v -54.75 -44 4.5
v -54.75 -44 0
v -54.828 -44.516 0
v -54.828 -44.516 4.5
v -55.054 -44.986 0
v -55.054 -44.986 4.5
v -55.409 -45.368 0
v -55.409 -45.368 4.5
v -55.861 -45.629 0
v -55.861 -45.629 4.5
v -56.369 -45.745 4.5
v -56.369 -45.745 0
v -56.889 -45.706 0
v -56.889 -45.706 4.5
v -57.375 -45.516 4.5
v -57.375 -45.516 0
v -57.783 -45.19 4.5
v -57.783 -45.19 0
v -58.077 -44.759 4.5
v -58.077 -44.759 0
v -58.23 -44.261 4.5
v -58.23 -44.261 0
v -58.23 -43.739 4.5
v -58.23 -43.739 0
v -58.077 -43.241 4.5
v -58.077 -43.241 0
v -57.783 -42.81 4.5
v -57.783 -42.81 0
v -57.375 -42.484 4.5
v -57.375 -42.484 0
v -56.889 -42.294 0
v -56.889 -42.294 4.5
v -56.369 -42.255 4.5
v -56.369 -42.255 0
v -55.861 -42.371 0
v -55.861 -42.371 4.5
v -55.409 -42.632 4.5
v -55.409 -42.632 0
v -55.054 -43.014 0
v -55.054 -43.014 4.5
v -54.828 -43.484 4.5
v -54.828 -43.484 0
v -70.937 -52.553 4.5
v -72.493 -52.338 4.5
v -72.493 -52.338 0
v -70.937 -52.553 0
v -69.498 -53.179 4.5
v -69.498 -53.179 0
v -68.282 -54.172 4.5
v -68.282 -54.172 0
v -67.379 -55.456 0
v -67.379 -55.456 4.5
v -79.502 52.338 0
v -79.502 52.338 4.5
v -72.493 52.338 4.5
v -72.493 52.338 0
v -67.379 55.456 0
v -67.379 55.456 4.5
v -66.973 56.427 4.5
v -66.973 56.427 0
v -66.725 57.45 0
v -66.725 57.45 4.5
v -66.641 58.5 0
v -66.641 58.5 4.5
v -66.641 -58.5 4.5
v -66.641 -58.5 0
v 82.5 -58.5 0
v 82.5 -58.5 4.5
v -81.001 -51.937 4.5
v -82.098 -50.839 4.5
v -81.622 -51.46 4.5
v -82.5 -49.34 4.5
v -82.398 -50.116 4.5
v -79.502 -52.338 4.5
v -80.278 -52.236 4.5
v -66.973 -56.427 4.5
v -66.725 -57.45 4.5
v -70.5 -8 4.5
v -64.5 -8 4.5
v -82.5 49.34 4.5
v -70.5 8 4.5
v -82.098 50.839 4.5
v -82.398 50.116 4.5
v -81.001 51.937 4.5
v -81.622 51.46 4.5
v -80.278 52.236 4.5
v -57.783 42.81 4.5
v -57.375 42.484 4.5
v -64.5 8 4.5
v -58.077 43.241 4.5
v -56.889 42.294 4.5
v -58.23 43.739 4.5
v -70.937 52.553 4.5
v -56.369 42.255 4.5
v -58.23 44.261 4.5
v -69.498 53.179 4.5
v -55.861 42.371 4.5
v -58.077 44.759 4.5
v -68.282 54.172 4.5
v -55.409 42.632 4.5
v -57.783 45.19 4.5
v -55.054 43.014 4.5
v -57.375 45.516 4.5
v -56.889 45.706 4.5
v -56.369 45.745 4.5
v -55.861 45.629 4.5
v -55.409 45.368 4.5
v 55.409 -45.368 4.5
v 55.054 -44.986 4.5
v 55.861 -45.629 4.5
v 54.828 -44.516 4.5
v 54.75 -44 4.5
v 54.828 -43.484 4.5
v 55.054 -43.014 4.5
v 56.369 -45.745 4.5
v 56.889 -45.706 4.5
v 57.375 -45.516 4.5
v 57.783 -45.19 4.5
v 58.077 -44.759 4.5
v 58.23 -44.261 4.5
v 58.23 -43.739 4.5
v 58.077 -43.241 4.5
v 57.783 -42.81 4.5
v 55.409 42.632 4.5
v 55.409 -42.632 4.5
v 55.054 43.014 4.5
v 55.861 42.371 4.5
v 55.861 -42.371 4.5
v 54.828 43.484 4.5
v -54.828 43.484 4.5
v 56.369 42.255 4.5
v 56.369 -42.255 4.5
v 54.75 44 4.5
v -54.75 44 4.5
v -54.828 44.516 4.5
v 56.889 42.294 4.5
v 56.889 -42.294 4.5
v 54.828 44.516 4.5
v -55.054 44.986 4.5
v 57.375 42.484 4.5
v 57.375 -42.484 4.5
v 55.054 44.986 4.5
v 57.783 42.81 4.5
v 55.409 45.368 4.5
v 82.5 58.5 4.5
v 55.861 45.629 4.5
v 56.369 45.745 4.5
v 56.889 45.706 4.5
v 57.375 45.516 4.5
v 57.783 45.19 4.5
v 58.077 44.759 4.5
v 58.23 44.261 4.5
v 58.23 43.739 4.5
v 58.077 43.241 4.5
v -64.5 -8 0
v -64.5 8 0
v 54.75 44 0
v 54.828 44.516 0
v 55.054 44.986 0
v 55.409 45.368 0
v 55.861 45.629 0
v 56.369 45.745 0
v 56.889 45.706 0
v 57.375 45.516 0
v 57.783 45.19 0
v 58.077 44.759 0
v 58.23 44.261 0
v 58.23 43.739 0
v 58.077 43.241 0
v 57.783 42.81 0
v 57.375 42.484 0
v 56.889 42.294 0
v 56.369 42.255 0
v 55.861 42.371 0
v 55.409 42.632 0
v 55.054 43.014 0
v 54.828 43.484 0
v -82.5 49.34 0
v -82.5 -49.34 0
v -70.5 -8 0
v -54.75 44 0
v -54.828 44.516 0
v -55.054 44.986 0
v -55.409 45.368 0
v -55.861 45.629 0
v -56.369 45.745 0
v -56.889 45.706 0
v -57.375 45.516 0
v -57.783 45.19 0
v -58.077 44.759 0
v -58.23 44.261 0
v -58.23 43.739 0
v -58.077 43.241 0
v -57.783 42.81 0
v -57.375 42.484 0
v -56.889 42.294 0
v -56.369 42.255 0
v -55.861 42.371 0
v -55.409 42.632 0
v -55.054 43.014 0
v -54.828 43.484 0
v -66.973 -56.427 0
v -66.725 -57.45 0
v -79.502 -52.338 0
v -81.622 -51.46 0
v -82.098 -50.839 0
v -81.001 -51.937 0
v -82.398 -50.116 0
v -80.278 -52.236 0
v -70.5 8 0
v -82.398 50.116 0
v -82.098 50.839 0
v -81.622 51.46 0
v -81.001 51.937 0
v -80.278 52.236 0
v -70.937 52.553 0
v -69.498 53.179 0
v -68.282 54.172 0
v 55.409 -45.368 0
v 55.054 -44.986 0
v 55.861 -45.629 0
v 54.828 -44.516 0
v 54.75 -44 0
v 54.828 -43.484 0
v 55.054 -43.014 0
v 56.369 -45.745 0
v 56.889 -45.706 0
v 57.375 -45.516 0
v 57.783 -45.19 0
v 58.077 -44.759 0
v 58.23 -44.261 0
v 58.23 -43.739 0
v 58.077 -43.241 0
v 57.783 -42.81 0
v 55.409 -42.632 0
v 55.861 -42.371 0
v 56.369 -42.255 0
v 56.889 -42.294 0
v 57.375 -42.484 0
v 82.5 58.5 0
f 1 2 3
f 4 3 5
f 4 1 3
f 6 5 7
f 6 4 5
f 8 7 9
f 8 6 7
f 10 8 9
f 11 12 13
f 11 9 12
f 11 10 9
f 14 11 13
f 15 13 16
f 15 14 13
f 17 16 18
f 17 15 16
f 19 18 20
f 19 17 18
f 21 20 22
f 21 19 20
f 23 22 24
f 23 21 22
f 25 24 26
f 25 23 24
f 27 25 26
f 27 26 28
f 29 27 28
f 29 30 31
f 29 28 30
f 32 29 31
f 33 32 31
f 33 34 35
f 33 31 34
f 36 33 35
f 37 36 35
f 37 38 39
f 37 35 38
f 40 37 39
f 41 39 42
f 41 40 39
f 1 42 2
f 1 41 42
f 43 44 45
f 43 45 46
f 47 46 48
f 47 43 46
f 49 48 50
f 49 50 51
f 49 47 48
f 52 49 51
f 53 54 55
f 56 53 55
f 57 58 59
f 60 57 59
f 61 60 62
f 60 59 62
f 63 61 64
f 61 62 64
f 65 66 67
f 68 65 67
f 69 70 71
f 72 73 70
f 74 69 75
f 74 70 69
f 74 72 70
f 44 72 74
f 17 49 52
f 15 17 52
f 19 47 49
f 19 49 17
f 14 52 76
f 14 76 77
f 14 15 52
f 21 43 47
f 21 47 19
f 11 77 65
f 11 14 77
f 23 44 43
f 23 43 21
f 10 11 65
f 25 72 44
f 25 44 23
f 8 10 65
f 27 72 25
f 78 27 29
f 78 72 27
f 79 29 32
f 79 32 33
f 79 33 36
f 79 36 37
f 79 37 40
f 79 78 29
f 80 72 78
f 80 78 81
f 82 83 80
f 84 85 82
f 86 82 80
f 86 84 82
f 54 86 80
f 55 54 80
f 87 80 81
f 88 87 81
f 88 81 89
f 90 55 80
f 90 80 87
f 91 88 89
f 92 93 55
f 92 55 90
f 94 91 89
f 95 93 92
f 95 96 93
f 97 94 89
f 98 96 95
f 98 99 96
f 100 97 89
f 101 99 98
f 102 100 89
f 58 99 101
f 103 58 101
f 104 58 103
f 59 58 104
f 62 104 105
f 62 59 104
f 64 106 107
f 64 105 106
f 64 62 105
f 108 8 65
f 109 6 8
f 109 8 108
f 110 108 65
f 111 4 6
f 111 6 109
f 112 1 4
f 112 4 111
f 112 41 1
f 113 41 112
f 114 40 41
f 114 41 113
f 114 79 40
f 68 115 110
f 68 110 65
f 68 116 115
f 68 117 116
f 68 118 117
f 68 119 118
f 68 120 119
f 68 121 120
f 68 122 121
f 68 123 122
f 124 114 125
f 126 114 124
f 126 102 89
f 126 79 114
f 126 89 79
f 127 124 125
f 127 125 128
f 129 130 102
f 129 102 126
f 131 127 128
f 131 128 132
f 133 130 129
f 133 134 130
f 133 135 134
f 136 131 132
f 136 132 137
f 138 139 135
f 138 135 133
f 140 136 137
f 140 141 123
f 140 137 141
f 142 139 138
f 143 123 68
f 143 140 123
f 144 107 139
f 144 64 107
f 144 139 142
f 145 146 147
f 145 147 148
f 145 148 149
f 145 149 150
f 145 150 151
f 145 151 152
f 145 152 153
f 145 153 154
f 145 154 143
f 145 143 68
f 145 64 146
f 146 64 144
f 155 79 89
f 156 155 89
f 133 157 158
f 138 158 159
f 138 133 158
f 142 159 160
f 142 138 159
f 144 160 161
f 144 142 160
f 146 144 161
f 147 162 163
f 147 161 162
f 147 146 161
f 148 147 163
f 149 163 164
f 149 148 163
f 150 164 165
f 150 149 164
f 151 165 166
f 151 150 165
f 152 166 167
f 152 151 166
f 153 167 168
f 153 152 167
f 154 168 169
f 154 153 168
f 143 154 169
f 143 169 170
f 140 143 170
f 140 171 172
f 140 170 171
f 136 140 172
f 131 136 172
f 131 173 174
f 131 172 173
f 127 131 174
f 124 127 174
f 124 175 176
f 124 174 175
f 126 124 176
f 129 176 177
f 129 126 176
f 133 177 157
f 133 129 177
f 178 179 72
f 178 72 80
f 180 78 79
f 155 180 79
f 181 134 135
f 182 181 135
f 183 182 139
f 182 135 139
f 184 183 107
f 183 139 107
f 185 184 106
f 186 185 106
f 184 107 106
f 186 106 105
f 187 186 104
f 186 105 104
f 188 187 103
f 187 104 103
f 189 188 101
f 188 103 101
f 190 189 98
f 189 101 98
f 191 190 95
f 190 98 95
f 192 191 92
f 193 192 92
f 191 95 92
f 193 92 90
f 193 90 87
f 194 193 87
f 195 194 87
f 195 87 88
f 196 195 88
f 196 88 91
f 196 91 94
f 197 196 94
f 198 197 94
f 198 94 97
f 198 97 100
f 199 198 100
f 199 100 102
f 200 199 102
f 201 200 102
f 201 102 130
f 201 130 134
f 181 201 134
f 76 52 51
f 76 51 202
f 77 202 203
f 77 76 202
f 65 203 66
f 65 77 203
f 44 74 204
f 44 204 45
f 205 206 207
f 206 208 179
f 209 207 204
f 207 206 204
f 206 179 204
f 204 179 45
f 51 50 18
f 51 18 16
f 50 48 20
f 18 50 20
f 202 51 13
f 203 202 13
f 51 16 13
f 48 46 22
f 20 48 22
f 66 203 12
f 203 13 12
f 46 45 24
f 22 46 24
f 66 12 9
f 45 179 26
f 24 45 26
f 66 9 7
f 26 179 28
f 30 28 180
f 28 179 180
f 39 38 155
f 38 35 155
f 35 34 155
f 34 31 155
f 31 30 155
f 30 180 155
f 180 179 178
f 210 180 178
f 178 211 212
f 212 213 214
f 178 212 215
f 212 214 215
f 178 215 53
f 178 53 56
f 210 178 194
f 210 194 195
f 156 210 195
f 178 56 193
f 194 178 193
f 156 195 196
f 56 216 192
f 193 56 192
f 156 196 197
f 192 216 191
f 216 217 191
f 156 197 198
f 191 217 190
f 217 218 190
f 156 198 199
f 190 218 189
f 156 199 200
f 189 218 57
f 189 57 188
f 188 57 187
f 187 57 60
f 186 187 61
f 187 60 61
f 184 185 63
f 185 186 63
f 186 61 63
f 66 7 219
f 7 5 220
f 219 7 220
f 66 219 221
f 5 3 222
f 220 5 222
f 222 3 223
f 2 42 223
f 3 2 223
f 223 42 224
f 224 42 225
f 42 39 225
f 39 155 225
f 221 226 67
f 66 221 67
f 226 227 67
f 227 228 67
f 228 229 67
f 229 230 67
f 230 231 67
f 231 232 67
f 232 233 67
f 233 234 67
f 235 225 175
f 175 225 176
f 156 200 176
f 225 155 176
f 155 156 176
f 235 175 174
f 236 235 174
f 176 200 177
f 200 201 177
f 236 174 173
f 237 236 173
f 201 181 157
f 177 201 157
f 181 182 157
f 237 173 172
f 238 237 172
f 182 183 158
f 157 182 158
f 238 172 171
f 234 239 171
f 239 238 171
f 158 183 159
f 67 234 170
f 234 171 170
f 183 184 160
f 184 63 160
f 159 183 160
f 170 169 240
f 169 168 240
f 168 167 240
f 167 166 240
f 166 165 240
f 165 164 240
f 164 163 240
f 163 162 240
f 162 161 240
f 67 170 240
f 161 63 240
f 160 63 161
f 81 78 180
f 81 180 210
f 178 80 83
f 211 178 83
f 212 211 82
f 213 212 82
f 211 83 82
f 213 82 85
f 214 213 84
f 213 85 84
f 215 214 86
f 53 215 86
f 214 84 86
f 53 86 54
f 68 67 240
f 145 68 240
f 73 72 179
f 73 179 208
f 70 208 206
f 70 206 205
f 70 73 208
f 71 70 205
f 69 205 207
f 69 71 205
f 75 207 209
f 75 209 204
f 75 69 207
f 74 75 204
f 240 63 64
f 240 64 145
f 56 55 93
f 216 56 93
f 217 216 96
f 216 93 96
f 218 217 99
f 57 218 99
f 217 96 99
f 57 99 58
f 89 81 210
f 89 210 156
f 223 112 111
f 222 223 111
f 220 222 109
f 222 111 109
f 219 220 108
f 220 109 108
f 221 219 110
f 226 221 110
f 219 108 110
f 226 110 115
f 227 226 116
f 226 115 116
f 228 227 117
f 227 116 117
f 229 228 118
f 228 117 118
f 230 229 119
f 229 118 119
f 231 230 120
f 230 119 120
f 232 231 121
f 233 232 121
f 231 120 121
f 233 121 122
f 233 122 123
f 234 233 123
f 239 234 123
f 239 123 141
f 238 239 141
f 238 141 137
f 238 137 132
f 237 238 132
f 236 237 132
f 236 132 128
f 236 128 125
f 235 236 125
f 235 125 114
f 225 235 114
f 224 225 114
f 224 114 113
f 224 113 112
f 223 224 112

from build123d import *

# Parameters (mm, degrees)
SKETCH2_W               = 165
SKETCH2_H               = 117
BOSS_EXTRUDE1_DEPTH     = 4.5
SKETCH3_R               = 1.75
CUT_EXTRUDE1_DEPTH      = 5.5
MIRROR2_COPY_1_SKETCH_R = 1.75
MIRROR2_COPY_1_DEPTH    = 5.5
CUT_EXTRUDE2_REACH      = 6.5
SKETCH4_W               = 6
SKETCH4_H               = 16
CUT_EXTRUDE3_DEPTH      = 4.5


with BuildPart() as part:
    # Sketch2 → Boss-Extrude1 (new body)
    with BuildSketch(Plane.XY):
        Rectangle(SKETCH2_W, SKETCH2_H)
    extrude(amount=BOSS_EXTRUDE1_DEPTH)

    # Sketch3 → Cut-Extrude1 (cut, through all)
    with BuildSketch(Plane.XY.offset(4.5)):
        with Locations((-56.5, 44)):
            Circle(SKETCH3_R)
    cut_extrude1 = extrude(amount=-CUT_EXTRUDE1_DEPTH, mode=Mode.SUBTRACT)

    # Mirror1: Cut-Extrude1 across plane
    add(cut_extrude1.mirror(Plane(origin=(0, 0, 0), x_dir=(0, 0, 1), z_dir=(1, 0, 0))), mode=Mode.SUBTRACT)

    # Mirror2: Cut-Extrude1 across plane
    add(cut_extrude1.mirror(Plane.ZX), mode=Mode.SUBTRACT)

    # Mirror2 copy 1 sketch → Mirror2 copy 1 (cut, through all)
    with BuildSketch(Plane(origin=(0, 0, 4.5), x_dir=(-1, 0, 0), z_dir=(0, 0, 1))):
        with Locations((-56.5, 44)):
            Circle(MIRROR2_COPY_1_SKETCH_R)
    extrude(amount=-MIRROR2_COPY_1_DEPTH, mode=Mode.SUBTRACT)

    # Sketch4 → Cut-Extrude2 (cut, up to next)
    with BuildSketch(Plane.XY.offset(4.5), mode=Mode.PRIVATE) as cut_extrude2_sk1:
        with Locations((-67.5, 0)):
            Rectangle(SKETCH4_W, SKETCH4_H)
    cut_extrude2_tool1 = extrude(cut_extrude2_sk1.sketch, amount=-CUT_EXTRUDE2_REACH, mode=Mode.PRIVATE) & part.part
    add(cut_extrude2_tool1.solids().sort_by_distance((-67.5, 0, 4.5))[0], mode=Mode.SUBTRACT)

    # Sketch5 → Cut-Extrude3 (cut)
    with BuildSketch(Plane.XY.offset(4.5)):
        with BuildLine():
            ThreePointArc((-82.5, 49.340007913), (-81.621787101, 51.460201405), (-79.501593608, 52.338414304))
            Line((-79.501593608, 52.338414304), (-72.492625761, 52.338414304))
            ThreePointArc((-72.492625761, 52.338414304), (-69.498148124, 53.179301378), (-67.379159906, 55.456114132))
            ThreePointArc((-67.379159906, 55.456114132), (-66.828268927, 56.933959128), (-66.641125435, 58.5))
            Line((-66.641125435, 58.5), (-82.5, 58.5))
            Line((-82.5, 58.5), (-82.5, 49.340007913))
        make_face()
    cut_extrude3 = extrude(amount=-CUT_EXTRUDE3_DEPTH, mode=Mode.SUBTRACT)

    # Mirror3: Cut-Extrude3 across plane
    add(cut_extrude3.mirror(Plane.ZX), mode=Mode.SUBTRACT)


solid = part.part
